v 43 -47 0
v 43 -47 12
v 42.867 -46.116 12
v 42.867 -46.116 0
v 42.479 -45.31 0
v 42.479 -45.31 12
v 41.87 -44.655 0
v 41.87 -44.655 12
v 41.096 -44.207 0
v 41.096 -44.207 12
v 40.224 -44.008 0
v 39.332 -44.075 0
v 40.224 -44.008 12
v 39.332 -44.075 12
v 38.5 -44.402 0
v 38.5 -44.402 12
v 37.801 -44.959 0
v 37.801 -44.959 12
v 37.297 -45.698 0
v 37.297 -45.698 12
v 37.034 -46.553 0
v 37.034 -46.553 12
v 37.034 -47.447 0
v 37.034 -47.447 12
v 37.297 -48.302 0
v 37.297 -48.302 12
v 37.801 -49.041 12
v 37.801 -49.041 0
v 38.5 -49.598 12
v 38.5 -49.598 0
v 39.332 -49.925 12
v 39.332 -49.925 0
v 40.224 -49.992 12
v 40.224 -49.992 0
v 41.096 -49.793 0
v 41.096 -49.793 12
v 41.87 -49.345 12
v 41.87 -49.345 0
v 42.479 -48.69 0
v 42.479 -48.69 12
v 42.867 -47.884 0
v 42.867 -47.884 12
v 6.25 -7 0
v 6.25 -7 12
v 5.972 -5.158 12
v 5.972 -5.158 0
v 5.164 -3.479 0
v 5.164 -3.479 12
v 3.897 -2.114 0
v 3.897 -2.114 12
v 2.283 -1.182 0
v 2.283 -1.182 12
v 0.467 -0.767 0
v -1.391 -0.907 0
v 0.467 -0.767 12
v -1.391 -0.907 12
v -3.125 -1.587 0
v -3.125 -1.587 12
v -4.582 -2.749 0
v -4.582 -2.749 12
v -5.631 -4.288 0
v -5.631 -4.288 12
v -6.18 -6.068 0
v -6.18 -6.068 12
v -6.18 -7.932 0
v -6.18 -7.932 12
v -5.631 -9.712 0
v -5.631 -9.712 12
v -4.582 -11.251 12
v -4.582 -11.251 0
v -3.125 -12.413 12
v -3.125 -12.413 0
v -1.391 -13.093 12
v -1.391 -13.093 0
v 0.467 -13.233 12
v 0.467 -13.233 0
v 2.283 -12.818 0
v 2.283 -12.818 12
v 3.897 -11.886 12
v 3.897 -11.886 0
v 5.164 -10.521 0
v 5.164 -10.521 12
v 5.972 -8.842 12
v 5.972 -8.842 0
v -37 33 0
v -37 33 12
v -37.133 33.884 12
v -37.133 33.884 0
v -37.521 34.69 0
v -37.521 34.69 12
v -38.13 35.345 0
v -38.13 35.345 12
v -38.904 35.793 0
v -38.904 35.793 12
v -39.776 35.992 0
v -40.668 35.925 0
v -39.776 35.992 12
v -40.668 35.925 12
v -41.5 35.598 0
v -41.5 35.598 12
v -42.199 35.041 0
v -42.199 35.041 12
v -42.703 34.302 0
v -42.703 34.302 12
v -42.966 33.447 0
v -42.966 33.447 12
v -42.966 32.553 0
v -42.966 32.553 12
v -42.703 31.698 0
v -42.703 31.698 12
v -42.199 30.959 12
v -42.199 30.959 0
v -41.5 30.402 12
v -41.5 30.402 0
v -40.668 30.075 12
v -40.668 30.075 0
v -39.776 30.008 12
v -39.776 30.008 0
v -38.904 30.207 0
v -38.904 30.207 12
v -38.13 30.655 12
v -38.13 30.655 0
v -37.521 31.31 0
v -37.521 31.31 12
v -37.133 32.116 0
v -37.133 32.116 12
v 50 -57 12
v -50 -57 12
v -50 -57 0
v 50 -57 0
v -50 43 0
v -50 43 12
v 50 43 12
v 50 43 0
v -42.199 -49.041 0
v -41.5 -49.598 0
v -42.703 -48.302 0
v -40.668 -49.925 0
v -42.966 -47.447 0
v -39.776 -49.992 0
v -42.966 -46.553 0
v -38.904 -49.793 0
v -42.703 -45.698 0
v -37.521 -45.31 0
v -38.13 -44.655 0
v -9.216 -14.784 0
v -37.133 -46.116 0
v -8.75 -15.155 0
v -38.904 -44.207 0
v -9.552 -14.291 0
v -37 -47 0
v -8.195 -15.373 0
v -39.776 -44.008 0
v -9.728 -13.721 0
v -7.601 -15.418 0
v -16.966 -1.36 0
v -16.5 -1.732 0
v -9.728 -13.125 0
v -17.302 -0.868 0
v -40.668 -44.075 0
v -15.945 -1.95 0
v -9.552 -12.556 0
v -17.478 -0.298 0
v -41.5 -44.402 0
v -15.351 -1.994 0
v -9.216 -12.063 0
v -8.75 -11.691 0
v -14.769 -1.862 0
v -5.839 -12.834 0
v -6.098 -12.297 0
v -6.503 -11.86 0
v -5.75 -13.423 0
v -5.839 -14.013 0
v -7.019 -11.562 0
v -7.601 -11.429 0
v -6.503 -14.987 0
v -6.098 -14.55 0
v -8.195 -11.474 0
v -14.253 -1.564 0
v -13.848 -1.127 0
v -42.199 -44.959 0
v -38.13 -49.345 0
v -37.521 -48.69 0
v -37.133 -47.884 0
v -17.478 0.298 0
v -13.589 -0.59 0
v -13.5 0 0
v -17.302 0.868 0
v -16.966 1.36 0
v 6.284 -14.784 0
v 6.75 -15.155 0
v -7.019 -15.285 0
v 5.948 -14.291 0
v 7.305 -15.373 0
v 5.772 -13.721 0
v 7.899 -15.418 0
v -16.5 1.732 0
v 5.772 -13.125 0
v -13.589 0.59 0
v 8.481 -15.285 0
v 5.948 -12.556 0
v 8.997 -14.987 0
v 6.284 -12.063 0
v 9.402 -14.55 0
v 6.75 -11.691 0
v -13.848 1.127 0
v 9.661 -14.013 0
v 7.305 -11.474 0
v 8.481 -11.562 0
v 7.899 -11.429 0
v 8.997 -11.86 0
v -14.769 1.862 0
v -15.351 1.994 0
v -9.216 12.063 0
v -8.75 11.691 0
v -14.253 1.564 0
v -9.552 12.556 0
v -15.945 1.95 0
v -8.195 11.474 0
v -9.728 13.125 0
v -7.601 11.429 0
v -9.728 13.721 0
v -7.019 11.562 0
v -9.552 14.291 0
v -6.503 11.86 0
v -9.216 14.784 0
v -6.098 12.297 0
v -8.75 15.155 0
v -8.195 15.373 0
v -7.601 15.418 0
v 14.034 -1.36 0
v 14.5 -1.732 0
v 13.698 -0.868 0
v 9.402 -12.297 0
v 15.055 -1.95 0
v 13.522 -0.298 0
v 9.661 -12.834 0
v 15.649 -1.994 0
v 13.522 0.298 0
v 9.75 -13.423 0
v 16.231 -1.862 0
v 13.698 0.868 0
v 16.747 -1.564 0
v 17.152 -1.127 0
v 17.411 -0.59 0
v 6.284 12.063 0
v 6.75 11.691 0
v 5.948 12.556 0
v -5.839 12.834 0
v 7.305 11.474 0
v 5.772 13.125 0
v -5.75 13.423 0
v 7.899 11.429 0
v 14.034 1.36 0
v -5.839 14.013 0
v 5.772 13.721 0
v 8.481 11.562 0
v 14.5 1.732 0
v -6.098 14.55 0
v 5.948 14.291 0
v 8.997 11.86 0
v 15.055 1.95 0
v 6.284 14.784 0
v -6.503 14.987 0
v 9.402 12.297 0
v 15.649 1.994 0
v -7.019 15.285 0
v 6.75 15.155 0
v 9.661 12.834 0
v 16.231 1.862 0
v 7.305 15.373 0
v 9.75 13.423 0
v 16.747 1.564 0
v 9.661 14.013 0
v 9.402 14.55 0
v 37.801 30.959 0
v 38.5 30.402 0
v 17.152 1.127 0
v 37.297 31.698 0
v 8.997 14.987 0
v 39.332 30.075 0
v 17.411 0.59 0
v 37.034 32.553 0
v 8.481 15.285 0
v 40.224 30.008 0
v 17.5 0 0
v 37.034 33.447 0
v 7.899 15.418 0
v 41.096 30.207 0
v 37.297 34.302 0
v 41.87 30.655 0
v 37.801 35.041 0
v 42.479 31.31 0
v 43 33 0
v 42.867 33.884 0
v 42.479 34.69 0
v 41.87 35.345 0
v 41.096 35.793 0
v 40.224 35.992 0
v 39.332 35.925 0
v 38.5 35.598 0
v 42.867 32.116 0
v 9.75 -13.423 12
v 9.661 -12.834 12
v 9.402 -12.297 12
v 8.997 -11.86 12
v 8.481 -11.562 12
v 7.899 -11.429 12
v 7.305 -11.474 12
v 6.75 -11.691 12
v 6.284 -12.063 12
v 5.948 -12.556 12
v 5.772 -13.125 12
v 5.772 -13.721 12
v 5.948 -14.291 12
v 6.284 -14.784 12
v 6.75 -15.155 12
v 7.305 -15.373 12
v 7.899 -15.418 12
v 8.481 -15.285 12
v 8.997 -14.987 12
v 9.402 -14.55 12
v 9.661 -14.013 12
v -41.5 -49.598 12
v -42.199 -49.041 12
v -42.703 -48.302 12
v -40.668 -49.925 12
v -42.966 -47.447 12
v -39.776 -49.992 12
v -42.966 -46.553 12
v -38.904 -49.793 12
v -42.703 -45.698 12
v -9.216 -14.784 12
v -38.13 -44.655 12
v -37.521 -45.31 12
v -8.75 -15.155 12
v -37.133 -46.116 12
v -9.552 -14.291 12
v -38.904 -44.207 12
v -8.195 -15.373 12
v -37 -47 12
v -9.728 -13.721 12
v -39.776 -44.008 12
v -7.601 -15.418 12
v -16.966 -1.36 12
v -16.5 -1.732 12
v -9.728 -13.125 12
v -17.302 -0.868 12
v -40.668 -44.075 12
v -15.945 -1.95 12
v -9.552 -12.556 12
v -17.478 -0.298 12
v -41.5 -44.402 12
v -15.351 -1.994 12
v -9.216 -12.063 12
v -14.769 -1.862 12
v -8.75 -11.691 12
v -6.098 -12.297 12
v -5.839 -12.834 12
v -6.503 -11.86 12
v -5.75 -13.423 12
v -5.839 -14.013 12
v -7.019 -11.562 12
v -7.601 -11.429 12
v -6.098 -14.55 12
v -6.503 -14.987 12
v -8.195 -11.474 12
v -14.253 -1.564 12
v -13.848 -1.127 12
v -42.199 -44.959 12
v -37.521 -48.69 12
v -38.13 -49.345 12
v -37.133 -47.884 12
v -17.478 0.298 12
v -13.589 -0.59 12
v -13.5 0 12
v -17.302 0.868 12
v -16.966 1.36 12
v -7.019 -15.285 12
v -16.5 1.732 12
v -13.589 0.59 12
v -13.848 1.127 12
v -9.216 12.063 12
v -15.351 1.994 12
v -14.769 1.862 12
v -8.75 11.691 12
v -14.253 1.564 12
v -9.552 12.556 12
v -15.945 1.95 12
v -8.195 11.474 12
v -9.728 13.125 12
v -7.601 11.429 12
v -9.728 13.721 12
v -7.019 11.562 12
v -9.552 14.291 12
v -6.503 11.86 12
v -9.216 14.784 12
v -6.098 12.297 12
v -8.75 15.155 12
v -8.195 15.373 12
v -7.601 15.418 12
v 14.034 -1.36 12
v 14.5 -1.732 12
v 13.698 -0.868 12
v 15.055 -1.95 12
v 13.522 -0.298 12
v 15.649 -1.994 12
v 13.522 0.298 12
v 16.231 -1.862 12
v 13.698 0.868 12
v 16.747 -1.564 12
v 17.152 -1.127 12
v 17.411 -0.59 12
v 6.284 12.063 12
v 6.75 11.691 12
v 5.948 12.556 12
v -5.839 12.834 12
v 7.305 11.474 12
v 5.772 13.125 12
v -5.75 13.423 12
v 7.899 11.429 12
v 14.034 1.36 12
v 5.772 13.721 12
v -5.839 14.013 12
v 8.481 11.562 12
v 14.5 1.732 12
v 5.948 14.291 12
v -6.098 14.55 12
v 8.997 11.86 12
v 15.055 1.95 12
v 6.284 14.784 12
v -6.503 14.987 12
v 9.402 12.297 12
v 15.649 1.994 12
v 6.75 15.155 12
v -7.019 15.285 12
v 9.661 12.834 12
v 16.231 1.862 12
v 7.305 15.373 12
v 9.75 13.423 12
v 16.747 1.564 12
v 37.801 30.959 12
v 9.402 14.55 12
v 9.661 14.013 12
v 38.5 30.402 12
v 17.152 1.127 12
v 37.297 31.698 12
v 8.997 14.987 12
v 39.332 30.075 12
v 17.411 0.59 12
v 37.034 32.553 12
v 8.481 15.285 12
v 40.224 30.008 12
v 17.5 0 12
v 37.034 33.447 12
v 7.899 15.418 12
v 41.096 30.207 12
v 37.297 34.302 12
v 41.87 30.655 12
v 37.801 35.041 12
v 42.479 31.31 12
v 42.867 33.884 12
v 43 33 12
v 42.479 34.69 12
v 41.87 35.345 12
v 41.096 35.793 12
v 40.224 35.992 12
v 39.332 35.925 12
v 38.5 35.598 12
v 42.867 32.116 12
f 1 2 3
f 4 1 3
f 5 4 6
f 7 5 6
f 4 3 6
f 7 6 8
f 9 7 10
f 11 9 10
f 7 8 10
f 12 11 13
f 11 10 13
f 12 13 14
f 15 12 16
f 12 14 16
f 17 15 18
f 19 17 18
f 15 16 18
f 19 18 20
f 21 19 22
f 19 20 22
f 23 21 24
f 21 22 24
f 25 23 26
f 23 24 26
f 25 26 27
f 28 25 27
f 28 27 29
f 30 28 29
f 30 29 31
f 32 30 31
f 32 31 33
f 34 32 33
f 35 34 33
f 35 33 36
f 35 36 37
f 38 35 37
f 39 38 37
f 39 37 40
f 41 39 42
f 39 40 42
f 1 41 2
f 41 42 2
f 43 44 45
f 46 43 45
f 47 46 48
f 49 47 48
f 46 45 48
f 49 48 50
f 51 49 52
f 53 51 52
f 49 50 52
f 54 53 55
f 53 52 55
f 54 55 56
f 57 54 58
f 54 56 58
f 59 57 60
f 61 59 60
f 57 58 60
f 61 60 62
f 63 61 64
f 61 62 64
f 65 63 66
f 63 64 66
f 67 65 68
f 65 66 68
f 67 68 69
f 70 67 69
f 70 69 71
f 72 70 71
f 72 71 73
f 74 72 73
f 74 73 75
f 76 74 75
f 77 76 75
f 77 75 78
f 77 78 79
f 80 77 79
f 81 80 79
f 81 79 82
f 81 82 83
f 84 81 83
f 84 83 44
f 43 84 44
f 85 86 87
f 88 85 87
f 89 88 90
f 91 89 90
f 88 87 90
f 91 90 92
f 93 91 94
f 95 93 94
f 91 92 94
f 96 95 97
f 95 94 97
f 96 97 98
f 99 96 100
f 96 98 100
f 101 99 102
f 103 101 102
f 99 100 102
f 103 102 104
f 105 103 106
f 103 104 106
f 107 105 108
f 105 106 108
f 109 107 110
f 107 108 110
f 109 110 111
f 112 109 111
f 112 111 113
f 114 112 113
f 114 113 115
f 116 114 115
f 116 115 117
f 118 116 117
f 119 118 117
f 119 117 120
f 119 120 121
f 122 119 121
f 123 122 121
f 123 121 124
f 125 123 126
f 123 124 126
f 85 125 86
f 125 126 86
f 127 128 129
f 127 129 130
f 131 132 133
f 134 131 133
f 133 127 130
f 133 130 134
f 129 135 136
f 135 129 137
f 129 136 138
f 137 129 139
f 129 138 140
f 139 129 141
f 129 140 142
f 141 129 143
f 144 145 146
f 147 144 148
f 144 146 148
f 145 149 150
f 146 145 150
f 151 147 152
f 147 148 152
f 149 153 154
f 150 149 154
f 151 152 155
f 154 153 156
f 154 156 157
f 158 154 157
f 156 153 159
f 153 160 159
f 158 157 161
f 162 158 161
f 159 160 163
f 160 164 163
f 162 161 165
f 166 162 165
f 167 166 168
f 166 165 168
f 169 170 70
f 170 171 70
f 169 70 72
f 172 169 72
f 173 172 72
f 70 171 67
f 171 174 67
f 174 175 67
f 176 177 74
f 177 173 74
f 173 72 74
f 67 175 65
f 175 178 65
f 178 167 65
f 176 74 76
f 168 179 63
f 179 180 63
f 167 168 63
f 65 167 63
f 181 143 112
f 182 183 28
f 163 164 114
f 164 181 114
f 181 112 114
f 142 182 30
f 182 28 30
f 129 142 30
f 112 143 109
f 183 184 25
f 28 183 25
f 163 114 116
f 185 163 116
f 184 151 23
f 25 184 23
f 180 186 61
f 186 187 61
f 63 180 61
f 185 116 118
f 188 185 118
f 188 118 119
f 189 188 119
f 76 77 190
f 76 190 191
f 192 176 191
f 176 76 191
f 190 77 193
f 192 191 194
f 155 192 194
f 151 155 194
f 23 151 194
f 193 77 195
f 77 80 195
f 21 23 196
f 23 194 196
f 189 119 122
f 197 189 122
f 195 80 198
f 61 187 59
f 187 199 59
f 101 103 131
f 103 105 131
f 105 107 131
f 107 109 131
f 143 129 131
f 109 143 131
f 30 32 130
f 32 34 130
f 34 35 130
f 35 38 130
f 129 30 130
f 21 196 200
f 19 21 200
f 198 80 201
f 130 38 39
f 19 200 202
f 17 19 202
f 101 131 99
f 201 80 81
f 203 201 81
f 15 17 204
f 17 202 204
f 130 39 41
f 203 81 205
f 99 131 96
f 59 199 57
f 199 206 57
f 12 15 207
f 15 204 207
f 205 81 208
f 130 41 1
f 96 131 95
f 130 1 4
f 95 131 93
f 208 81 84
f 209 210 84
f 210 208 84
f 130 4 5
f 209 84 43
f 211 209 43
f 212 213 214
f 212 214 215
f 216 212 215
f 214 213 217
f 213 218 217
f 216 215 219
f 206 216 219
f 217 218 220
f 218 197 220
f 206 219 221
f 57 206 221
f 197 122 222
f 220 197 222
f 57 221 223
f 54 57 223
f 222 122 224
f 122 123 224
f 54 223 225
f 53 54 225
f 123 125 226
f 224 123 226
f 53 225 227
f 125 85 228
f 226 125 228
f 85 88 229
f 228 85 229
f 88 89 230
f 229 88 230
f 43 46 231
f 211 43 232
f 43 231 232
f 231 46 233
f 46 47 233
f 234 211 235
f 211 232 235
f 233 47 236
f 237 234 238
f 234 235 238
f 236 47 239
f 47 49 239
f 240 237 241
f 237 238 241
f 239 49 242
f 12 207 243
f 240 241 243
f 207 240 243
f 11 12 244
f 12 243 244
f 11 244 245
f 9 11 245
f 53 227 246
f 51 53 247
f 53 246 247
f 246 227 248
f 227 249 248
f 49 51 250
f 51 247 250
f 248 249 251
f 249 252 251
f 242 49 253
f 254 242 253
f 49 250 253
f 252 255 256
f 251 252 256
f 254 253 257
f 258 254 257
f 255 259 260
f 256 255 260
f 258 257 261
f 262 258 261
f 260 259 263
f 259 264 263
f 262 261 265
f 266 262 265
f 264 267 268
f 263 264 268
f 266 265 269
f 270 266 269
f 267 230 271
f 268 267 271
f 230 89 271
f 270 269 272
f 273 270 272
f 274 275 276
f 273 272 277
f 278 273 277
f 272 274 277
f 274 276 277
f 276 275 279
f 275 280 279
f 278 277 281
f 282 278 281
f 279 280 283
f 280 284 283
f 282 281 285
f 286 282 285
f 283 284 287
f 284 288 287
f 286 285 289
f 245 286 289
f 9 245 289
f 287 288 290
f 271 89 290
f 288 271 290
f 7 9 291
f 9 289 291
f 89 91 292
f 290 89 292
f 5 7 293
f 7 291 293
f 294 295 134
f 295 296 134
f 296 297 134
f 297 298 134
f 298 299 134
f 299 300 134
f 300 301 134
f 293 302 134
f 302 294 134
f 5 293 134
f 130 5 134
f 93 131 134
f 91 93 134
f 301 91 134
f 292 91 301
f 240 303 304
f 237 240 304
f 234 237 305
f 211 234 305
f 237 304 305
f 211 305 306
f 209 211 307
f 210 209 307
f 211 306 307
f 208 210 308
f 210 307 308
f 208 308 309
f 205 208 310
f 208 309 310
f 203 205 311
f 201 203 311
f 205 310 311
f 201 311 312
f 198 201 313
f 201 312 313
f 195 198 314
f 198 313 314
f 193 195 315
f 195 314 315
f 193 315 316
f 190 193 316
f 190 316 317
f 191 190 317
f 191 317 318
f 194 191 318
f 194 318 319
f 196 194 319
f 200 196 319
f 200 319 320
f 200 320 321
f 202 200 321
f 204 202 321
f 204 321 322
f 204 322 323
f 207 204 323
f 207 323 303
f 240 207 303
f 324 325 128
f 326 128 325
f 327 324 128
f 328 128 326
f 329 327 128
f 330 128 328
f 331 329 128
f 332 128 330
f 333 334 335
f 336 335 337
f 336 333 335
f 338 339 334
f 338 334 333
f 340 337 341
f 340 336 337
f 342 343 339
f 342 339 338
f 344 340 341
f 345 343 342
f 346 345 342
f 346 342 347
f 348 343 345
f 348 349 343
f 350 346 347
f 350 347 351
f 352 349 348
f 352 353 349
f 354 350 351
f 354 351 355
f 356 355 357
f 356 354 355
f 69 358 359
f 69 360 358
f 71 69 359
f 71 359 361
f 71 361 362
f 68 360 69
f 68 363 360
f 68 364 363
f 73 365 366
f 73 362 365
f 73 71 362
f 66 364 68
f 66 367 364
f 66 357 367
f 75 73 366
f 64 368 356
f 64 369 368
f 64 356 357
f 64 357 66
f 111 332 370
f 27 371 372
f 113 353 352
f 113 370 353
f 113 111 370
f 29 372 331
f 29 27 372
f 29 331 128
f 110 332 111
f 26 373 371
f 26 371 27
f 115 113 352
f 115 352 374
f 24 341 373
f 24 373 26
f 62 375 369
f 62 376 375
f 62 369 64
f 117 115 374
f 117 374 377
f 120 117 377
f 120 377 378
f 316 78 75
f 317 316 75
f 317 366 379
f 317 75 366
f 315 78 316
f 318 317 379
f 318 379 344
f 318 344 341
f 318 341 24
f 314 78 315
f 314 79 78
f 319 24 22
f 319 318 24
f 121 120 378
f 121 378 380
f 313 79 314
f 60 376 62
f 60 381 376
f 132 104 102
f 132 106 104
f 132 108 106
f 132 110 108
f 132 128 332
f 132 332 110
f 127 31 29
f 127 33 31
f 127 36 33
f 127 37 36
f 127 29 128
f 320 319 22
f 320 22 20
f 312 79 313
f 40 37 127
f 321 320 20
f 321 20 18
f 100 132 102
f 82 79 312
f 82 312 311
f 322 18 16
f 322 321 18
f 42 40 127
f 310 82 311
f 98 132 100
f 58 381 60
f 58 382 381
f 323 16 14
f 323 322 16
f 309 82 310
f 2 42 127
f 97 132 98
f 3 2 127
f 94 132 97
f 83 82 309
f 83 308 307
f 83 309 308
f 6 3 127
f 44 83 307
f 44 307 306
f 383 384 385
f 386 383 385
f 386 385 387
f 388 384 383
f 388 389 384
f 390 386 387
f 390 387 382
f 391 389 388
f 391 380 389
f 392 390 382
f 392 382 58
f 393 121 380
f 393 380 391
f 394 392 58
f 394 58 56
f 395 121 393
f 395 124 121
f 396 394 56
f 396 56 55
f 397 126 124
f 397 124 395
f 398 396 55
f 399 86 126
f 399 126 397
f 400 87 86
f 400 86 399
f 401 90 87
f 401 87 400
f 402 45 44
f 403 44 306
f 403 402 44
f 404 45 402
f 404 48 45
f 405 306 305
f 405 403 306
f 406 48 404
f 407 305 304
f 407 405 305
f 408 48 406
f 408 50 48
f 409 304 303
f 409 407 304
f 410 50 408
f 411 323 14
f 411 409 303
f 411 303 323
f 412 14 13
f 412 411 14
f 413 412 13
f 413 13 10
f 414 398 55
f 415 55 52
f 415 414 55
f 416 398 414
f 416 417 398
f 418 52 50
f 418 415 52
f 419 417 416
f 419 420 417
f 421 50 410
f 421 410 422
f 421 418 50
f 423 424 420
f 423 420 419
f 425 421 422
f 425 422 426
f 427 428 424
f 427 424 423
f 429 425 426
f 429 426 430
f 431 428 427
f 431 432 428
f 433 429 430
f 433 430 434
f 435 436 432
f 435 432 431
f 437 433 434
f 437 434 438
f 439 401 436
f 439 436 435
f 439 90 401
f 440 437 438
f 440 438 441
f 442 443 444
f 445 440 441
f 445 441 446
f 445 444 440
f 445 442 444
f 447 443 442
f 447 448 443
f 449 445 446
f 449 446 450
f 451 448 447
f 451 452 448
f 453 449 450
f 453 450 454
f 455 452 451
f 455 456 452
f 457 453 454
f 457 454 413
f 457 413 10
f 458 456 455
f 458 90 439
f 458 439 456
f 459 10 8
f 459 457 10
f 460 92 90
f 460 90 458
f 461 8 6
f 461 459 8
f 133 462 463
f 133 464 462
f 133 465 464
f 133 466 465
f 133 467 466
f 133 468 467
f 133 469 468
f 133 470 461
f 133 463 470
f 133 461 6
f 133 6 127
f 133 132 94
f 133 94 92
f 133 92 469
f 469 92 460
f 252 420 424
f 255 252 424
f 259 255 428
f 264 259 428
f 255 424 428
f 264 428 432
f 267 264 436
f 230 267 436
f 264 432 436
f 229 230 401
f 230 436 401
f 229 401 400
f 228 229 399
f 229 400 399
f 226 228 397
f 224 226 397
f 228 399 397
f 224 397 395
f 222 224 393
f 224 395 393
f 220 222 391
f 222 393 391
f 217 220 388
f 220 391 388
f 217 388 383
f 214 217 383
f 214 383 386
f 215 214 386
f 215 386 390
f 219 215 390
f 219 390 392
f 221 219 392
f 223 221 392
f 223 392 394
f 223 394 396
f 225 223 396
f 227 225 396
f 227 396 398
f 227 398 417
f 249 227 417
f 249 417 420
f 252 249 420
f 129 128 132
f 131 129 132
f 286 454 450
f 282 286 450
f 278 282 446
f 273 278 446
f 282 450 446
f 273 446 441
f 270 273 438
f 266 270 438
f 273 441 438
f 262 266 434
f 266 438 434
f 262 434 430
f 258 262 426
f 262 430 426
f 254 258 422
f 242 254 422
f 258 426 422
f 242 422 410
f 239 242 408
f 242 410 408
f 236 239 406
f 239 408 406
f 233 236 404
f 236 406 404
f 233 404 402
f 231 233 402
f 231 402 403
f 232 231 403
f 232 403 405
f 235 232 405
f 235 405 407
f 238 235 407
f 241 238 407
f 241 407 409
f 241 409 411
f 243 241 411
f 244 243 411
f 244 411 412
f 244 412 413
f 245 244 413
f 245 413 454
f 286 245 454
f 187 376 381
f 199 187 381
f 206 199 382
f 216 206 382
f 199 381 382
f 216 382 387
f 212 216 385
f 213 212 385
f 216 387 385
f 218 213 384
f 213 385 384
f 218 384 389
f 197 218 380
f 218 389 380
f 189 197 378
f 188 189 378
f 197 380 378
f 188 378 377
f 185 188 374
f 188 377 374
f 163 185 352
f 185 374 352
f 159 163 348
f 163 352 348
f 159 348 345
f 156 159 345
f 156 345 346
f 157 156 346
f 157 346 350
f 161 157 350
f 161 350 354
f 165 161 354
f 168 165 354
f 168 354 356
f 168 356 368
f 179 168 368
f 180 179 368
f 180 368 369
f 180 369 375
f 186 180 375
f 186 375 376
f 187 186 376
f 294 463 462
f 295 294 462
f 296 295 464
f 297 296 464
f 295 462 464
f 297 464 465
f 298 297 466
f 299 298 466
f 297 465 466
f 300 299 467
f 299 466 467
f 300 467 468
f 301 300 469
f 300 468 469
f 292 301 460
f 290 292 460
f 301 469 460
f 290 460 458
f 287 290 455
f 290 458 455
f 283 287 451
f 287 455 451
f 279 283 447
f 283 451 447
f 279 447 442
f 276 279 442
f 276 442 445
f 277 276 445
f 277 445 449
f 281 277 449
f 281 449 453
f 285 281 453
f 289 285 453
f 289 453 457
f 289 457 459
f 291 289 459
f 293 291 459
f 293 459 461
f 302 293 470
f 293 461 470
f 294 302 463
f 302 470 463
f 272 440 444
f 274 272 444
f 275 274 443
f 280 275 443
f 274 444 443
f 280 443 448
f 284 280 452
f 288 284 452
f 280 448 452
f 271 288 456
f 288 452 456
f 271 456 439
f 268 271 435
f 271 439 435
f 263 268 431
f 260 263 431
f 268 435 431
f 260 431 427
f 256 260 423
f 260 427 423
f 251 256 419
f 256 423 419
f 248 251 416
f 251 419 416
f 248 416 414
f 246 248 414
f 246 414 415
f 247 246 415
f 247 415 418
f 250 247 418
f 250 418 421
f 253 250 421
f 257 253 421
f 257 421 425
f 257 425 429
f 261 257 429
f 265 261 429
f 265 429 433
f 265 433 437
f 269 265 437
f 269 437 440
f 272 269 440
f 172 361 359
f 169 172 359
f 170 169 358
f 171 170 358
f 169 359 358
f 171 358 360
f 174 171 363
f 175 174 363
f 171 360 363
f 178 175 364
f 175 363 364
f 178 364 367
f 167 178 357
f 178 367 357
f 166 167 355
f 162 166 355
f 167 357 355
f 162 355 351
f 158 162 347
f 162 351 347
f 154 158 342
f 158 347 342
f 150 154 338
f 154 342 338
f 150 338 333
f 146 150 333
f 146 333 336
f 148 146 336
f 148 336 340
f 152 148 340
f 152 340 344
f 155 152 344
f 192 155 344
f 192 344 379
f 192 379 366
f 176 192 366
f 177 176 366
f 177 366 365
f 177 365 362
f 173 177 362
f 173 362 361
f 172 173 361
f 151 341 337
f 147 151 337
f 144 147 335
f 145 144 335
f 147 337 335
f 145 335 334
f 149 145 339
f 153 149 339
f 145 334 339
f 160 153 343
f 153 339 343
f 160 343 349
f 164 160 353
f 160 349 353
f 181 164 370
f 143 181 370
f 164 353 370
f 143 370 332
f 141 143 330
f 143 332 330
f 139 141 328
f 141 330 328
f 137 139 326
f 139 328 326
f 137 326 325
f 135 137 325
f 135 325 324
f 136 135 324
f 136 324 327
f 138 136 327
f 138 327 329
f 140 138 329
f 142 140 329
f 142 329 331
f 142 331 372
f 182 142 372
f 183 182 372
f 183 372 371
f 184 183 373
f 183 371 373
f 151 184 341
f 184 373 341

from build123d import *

# Parameters (mm, degrees)
ESQUISSE1_R             = 18.5
BOSS_EXTRU_1_DEPTH      = 12
ESQUISSE2_R             = 2
ENL_V_MAT_EXTRU_1_DEPTH = 13
ESQUISSE3_R             = 6.25
ENL_V_MAT_EXTRU_2_DEPTH = 13
ESQUISSE4_W             = 100
ESQUISSE4_H             = 100
ESQUISSE4_R             = 18.5
BOSS_EXTRU_2_DEPTH      = 12
ESQUISSE5_R             = 3
ENL_V_MAT_EXTRU_3_DEPTH = 12


with BuildPart() as part:
    # Esquisse1 → Boss.-Extru.1 (new body)
    with BuildSketch(Plane.XY):
        Circle(ESQUISSE1_R)
    extrude(amount=BOSS_EXTRU_1_DEPTH)

    # Esquisse2 → Enlèv. mat.-Extru.1 (cut, through all)
    with BuildSketch(Plane.XY.offset(12)):
        with Locations((15.5, 0)):
            Circle(ESQUISSE2_R)
        with Locations((7.75, -13.423393759)):
            Circle(ESQUISSE2_R)
        with Locations((-7.75, -13.423393759)):
            Circle(ESQUISSE2_R)
        with Locations((-15.5, 0)):
            Circle(ESQUISSE2_R)
        with Locations((-7.75, 13.423393759)):
            Circle(ESQUISSE2_R)
        with Locations((7.75, 13.423393759)):
            Circle(ESQUISSE2_R)
    extrude(amount=-ENL_V_MAT_EXTRU_1_DEPTH, mode=Mode.SUBTRACT)

    # Esquisse3 → Enlèv. mat.-Extru.2 (cut, through all)
    with BuildSketch(Plane.XY.offset(12)):
        with Locations((0, -7)):
            Circle(ESQUISSE3_R)
    extrude(amount=-ENL_V_MAT_EXTRU_2_DEPTH, mode=Mode.SUBTRACT)

    # Esquisse4 → Boss.-Extru.2 (add)
    with BuildSketch(Plane.XY.offset(12)):
        with Locations((0, -7)):
            Rectangle(ESQUISSE4_W, ESQUISSE4_H)
        Circle(ESQUISSE4_R, mode=Mode.SUBTRACT)
    extrude(amount=-BOSS_EXTRU_2_DEPTH)

    # Esquisse5 → Enlèv. mat.-Extru.3 (cut)
    with BuildSketch(Plane.XY.offset(12)):
        with Locations((-40, 33)):
            Circle(ESQUISSE5_R)
        with Locations((40, 33)):
            Circle(ESQUISSE5_R)
        with Locations((40, -47)):
            Circle(ESQUISSE5_R)
        with Locations((-40, -47)):
            Circle(ESQUISSE5_R)
    extrude(amount=-ENL_V_MAT_EXTRU_3_DEPTH, mode=Mode.SUBTRACT)


solid = part.part
